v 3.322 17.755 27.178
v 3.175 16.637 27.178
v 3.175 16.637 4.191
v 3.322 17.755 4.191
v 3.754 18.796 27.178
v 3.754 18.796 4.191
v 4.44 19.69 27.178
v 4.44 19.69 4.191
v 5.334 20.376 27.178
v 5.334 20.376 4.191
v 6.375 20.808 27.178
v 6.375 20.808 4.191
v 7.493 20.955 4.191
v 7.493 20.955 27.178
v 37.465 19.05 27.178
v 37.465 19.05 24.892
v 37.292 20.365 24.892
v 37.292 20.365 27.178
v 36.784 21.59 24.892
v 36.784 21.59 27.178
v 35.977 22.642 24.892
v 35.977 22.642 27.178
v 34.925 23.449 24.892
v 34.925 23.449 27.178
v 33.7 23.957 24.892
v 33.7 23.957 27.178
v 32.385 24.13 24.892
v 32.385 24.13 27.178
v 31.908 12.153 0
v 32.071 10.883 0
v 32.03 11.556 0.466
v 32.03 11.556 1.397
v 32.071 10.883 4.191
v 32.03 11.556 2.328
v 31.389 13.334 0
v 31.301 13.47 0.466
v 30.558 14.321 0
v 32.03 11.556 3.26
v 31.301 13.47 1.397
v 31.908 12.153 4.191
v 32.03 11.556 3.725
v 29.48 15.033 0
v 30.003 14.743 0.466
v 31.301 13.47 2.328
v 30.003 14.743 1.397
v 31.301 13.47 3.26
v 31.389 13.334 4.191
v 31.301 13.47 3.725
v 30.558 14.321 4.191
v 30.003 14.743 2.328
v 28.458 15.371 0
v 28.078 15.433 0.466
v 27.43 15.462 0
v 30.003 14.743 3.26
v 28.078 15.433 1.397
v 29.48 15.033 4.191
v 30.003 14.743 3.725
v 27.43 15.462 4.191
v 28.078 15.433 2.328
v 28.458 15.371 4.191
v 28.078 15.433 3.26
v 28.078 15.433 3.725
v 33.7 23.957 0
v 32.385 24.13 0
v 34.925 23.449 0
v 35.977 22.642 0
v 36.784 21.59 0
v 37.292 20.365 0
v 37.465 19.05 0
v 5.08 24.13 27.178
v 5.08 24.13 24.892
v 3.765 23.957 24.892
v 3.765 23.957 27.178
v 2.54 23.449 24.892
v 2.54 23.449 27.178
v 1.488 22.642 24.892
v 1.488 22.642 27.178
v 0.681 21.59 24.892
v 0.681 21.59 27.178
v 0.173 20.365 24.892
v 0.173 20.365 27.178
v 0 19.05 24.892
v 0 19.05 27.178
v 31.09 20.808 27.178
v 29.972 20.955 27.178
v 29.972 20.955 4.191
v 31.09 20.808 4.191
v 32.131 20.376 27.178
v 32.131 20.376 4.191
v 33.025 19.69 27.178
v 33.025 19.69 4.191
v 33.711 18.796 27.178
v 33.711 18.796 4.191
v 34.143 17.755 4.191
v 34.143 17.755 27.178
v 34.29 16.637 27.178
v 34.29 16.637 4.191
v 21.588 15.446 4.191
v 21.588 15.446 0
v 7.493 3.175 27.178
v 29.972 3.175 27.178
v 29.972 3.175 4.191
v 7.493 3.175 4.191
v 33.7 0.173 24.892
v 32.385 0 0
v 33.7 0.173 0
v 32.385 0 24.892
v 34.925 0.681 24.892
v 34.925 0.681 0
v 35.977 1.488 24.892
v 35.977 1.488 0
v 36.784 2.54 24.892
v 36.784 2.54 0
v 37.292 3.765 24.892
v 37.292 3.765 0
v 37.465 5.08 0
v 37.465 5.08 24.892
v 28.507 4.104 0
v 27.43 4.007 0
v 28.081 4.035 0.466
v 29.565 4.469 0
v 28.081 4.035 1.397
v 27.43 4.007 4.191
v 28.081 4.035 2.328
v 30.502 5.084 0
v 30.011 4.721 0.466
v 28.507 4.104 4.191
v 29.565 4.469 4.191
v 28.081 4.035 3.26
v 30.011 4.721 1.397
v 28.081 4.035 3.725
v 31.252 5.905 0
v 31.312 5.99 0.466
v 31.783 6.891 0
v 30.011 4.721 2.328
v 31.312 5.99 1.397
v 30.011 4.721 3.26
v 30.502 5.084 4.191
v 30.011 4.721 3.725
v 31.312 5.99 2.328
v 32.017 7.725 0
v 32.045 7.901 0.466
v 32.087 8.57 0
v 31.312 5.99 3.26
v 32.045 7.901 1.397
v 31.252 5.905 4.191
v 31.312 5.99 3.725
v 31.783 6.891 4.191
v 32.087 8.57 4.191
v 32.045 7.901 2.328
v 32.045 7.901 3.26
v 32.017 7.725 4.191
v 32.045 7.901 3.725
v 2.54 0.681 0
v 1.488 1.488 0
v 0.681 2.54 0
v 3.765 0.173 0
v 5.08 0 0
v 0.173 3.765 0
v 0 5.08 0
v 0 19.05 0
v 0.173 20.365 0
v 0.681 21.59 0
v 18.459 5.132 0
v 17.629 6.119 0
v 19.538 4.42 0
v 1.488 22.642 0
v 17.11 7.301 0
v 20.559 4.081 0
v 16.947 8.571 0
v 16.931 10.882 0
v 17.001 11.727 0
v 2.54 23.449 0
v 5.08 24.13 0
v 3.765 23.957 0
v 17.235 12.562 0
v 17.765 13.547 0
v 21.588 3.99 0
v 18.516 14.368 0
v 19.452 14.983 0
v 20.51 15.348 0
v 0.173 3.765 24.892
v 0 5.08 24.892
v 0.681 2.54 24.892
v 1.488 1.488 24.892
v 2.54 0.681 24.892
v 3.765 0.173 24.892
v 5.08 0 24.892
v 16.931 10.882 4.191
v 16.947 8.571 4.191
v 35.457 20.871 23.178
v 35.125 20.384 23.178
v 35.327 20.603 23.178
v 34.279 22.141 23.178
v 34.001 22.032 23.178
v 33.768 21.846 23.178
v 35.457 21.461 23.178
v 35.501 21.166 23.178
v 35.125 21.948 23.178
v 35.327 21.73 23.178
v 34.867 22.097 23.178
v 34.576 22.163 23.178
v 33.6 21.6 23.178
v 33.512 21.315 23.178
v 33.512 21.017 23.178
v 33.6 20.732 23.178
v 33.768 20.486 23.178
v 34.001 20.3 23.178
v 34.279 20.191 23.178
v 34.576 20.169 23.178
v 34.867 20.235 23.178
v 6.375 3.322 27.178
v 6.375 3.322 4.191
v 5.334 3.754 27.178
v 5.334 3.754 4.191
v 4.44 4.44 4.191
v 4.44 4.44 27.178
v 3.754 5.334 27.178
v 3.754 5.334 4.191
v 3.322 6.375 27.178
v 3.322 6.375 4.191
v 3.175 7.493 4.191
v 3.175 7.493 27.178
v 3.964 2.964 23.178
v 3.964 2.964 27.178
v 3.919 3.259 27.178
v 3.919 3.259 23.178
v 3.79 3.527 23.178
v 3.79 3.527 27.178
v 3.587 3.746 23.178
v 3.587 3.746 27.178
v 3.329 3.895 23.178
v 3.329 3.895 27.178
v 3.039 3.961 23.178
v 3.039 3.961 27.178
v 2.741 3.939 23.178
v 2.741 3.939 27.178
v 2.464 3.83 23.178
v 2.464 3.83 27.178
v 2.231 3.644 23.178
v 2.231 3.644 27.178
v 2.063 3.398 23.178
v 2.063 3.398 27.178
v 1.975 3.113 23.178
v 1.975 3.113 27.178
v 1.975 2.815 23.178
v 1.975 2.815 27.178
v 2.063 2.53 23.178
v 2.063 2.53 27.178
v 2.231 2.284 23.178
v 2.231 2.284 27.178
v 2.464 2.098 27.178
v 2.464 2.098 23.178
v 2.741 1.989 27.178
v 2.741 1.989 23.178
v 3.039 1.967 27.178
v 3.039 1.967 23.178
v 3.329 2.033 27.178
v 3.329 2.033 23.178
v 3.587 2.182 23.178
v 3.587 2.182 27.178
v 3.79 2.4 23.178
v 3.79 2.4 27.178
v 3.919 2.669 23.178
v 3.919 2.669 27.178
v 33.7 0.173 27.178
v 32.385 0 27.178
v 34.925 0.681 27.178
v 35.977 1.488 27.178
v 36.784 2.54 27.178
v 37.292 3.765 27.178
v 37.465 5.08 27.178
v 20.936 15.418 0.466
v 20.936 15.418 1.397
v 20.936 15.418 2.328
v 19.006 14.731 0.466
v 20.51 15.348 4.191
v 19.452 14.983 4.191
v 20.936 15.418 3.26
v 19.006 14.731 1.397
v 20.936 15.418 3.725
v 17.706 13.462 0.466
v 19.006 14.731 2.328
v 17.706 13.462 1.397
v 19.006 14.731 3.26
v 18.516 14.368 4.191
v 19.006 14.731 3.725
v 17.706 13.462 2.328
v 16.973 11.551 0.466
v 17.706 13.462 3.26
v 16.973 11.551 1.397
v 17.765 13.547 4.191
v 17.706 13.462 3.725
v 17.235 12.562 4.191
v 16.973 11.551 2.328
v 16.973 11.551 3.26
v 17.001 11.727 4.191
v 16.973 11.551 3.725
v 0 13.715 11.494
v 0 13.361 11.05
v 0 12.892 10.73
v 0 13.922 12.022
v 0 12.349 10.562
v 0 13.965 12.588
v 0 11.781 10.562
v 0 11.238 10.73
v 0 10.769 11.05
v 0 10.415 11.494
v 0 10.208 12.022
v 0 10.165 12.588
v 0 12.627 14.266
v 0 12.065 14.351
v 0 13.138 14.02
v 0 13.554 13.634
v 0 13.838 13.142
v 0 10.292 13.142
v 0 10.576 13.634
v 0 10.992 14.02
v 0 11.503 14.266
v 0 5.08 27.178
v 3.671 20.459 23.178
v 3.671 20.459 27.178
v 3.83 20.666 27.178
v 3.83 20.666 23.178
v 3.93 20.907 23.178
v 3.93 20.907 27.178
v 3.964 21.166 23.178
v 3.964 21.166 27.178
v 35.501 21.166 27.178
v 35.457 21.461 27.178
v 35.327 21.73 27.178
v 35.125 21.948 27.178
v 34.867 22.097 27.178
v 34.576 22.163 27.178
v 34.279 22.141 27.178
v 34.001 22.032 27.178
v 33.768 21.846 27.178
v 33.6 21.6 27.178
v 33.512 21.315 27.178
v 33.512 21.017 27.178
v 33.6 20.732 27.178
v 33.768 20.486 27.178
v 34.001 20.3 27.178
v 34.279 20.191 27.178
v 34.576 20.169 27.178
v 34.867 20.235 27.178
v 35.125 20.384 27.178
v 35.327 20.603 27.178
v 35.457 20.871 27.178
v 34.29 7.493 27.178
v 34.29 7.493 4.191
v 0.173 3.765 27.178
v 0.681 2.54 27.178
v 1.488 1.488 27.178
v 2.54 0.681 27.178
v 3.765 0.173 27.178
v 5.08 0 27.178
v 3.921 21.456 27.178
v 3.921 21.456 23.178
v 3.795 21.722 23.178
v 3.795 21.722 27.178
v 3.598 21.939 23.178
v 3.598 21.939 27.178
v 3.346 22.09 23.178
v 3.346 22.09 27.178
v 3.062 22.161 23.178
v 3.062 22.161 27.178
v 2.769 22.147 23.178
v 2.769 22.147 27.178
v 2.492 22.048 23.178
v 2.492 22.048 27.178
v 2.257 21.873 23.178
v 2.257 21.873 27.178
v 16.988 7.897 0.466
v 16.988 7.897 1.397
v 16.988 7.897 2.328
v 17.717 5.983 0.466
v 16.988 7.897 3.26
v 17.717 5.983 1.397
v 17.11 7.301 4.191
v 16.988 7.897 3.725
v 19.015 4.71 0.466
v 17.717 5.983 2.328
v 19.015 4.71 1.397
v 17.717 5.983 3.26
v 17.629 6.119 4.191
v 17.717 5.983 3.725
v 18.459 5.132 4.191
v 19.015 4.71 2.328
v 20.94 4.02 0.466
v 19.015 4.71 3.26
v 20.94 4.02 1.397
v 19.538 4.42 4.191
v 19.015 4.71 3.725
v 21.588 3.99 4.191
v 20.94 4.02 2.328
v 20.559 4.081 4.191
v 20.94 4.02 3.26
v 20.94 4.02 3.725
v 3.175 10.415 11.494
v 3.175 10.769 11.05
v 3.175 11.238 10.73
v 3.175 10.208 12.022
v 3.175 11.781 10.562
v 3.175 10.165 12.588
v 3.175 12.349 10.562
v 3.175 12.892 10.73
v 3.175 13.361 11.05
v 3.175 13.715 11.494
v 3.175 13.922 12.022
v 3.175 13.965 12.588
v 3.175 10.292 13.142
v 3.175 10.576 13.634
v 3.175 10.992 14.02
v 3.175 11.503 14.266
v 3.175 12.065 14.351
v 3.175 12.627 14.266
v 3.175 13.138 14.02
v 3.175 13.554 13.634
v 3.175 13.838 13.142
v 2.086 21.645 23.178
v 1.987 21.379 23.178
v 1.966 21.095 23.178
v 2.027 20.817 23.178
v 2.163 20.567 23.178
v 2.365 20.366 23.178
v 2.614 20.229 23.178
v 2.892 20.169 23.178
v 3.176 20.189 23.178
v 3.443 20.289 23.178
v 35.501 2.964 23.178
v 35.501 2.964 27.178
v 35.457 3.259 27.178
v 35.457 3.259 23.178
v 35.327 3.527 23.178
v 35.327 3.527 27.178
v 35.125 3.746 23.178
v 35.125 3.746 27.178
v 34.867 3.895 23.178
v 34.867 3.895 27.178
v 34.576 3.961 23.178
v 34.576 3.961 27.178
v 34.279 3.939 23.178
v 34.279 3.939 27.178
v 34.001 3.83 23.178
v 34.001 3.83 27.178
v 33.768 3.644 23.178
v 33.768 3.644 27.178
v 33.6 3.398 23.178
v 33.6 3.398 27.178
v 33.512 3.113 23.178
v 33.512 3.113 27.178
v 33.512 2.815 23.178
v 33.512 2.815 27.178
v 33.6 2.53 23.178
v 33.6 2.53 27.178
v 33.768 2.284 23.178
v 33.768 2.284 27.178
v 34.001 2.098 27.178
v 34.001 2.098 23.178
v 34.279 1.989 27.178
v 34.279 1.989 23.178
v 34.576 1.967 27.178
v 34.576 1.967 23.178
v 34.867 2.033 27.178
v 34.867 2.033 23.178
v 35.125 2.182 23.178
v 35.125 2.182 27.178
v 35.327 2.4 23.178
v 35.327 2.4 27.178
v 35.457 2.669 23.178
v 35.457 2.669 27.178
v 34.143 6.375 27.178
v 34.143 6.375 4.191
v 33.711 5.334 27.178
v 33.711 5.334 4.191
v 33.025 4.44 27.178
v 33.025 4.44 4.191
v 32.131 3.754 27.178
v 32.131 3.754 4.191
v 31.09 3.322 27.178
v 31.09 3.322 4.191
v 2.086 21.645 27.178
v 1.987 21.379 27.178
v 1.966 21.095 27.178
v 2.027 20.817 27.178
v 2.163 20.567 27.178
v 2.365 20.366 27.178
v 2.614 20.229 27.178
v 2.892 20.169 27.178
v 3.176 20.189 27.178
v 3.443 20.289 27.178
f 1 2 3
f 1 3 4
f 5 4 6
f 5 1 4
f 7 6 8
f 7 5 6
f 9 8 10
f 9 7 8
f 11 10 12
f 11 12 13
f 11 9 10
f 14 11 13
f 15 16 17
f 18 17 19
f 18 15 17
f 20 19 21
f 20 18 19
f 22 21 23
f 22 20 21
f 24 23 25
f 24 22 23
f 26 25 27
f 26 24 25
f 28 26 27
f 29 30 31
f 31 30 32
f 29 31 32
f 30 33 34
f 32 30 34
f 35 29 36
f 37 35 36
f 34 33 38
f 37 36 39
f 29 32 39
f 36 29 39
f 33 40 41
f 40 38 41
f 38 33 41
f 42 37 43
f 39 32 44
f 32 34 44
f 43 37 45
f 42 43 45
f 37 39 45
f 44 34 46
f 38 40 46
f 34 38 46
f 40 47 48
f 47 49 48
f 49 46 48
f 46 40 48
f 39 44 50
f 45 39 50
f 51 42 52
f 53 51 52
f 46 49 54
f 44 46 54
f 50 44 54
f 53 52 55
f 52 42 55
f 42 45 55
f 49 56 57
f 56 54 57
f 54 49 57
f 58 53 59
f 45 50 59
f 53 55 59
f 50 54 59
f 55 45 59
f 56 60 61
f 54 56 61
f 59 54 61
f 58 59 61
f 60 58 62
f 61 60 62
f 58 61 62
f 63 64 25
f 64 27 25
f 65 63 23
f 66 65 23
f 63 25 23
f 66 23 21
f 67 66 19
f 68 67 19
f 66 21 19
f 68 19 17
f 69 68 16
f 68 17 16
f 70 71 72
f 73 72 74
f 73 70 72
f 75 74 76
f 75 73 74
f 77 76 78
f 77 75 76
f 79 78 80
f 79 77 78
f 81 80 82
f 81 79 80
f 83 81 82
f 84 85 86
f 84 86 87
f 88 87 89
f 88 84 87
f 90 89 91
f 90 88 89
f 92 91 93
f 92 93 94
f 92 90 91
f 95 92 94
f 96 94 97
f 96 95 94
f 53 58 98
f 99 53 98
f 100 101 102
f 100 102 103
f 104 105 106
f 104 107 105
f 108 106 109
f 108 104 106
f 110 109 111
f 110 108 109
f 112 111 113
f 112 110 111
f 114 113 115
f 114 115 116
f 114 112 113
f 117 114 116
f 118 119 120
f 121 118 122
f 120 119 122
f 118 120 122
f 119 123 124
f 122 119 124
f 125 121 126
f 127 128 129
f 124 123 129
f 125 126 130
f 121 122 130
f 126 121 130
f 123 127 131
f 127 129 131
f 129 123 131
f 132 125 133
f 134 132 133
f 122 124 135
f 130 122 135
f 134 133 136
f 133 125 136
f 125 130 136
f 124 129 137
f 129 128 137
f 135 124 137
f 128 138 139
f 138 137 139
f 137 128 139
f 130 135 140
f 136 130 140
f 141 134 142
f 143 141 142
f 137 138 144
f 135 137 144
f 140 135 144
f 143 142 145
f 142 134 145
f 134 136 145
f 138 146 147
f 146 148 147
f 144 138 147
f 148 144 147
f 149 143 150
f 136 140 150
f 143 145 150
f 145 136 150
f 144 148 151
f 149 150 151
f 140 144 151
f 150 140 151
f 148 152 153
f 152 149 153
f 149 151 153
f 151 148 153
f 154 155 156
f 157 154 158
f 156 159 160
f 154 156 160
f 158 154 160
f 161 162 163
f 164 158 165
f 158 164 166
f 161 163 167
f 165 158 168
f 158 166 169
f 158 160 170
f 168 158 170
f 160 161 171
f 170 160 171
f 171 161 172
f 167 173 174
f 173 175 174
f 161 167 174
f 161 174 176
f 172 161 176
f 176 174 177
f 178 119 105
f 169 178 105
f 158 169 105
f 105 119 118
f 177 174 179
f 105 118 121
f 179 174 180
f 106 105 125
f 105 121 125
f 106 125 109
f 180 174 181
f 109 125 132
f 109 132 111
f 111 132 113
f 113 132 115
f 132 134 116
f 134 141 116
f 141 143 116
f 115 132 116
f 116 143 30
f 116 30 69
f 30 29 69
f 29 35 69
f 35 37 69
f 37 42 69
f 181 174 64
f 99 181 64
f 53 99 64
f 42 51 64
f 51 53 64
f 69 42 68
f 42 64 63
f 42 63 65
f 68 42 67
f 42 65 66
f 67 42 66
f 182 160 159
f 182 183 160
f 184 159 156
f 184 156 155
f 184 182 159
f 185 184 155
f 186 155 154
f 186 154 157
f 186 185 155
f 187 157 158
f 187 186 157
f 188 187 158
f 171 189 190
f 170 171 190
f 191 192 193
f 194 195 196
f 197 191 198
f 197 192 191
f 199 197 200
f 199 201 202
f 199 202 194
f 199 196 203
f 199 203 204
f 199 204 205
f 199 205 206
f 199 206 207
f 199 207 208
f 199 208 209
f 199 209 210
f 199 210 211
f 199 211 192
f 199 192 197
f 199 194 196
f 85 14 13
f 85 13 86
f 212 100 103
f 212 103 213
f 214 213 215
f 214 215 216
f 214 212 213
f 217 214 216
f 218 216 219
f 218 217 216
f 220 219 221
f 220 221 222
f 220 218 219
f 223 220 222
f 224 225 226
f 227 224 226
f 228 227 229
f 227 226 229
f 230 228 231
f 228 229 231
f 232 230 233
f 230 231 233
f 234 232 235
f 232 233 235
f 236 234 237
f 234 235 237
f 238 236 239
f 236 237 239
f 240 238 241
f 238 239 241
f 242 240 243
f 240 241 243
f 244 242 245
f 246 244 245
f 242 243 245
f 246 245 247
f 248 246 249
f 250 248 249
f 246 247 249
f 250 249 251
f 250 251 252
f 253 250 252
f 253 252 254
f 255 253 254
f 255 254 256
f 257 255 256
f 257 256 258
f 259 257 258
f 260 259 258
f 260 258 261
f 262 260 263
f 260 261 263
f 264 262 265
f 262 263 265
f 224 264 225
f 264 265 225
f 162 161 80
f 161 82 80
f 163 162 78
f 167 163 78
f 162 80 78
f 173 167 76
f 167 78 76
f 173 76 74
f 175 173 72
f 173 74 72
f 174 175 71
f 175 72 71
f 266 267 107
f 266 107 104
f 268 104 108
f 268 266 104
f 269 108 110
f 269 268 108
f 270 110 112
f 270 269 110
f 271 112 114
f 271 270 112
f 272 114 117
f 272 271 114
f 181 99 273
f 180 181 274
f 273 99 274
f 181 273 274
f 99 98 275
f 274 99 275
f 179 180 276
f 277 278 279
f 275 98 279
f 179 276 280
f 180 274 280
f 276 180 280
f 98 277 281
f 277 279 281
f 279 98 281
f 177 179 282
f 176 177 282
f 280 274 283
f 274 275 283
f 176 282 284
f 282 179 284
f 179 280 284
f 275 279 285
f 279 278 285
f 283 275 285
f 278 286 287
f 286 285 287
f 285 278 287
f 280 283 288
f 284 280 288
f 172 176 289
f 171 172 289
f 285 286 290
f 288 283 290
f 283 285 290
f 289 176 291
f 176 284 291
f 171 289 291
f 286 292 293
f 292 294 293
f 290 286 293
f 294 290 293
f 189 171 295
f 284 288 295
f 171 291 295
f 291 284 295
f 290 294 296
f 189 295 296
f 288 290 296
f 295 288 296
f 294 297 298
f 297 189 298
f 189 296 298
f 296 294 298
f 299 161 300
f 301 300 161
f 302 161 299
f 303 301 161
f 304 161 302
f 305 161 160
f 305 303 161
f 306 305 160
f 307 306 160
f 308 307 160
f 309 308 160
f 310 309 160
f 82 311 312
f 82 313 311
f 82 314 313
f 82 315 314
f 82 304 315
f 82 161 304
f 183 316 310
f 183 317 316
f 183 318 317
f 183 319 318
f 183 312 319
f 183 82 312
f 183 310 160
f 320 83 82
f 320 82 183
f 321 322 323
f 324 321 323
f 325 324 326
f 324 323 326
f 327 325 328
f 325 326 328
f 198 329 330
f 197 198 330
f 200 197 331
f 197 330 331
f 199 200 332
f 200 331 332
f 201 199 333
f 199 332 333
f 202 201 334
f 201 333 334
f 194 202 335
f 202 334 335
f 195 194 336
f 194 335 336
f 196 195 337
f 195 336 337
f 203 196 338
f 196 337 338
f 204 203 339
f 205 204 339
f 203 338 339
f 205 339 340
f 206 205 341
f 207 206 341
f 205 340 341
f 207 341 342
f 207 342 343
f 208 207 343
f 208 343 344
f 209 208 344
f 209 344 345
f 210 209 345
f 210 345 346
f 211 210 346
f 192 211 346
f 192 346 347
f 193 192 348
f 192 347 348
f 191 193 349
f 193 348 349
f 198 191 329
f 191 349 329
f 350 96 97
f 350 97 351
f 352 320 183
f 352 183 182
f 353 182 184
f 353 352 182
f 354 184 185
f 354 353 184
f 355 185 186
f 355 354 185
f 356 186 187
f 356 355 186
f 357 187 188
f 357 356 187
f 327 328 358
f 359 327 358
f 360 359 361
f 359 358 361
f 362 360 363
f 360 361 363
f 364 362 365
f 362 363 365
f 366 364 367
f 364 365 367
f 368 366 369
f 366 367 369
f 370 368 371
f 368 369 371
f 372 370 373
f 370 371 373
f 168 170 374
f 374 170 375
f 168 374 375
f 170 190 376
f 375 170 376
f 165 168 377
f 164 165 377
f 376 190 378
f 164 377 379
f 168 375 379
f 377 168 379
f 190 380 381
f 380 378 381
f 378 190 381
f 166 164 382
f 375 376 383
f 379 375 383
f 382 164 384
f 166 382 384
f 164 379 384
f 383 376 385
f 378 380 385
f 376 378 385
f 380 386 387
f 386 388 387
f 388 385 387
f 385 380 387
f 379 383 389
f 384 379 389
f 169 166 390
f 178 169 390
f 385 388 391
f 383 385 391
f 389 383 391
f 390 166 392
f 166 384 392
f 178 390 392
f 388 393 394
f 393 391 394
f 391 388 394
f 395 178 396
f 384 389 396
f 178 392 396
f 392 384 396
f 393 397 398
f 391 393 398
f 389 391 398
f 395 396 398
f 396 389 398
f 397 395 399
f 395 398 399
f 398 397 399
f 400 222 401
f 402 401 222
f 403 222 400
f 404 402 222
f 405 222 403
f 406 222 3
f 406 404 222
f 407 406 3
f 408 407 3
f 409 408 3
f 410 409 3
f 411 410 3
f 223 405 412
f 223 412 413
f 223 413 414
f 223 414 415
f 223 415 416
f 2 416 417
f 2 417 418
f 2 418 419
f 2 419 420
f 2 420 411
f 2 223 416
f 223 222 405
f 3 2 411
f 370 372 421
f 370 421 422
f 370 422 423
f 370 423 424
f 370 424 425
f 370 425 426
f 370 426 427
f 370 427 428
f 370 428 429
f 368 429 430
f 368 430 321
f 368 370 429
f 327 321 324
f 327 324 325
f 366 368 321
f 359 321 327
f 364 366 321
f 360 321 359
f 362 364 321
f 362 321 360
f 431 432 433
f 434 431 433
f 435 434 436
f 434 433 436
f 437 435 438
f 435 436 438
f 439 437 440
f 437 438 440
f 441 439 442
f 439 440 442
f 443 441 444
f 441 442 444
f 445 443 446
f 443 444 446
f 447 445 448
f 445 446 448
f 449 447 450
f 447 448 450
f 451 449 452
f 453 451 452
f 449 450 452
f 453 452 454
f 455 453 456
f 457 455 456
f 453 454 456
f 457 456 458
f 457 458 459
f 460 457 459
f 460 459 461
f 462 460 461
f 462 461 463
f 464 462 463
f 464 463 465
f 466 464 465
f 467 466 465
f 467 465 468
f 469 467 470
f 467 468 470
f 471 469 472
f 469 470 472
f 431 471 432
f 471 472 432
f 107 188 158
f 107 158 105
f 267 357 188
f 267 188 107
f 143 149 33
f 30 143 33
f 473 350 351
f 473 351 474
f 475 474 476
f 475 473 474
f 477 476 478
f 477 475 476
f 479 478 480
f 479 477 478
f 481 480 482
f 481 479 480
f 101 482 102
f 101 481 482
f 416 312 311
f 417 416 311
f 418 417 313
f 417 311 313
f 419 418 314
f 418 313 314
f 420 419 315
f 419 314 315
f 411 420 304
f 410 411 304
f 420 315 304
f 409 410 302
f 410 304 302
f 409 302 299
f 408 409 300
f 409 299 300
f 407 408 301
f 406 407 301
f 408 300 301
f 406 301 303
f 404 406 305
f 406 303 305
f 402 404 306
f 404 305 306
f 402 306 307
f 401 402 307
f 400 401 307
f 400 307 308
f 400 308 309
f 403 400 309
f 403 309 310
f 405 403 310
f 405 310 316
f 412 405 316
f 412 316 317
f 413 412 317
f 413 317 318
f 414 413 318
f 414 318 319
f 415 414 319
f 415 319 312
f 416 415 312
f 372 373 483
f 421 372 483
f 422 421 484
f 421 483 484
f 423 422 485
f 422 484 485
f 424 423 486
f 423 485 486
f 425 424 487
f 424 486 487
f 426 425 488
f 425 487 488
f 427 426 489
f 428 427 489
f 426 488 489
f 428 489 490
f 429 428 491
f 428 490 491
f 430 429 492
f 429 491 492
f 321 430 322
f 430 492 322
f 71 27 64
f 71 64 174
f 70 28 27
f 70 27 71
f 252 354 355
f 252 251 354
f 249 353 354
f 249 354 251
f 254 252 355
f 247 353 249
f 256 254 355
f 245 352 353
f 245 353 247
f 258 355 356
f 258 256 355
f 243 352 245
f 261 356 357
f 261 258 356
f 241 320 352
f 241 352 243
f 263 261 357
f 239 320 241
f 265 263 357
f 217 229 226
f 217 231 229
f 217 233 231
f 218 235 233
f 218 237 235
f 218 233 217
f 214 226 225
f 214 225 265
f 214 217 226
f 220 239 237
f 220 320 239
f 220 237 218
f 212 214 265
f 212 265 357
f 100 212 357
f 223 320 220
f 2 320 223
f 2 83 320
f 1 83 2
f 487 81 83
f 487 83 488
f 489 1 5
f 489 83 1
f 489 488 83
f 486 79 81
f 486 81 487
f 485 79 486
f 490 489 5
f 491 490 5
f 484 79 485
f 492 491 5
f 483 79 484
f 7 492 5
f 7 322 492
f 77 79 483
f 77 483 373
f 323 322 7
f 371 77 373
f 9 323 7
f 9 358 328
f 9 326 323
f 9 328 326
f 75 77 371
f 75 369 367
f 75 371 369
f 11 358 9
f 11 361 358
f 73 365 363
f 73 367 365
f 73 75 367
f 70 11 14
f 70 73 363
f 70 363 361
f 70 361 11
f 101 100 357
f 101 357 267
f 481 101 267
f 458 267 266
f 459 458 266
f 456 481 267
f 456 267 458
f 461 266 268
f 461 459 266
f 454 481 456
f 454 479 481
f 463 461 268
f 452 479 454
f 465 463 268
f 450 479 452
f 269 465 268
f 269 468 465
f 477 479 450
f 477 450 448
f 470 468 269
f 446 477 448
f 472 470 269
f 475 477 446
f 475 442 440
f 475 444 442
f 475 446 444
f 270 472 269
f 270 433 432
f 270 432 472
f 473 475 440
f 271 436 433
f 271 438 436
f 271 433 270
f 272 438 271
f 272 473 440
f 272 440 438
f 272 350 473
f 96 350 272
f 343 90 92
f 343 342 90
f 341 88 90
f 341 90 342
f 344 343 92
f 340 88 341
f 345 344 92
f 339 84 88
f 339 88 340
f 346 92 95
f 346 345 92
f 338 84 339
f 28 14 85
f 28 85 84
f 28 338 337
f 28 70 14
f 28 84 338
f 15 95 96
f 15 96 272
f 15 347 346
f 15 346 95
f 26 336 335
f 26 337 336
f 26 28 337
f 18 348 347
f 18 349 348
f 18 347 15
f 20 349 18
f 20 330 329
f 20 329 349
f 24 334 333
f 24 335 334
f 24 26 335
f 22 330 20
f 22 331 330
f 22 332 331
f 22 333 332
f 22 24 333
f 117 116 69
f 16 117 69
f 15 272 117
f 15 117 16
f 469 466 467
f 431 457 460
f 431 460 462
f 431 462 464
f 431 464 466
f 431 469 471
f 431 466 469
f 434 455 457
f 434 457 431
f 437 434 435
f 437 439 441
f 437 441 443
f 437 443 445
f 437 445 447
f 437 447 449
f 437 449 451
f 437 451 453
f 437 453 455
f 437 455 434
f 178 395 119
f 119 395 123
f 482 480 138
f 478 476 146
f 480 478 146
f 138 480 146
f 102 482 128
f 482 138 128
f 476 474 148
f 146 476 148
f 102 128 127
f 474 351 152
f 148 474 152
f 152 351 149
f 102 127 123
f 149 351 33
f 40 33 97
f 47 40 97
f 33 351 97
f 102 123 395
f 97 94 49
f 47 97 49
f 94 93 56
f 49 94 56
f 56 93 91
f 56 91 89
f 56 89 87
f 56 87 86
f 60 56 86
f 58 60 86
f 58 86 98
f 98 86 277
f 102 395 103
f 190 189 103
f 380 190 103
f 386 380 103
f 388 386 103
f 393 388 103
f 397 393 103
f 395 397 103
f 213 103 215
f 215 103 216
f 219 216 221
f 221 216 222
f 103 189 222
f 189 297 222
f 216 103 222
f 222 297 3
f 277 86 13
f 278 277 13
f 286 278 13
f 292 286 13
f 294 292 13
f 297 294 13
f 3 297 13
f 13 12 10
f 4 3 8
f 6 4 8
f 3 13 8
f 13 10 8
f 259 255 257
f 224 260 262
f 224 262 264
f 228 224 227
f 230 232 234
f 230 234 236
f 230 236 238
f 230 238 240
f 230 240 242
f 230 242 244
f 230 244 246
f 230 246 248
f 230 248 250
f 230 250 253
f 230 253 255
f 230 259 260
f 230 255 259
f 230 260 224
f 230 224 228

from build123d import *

# Parameters (mm, degrees)
SKETCH2_W           = 37.465
SKETCH2_H           = 24.13
BOSS_EXTRUDE1_DEPTH = 24.892
CUT_EXTRUDE1_DEPTH  = 20.701
CUT_EXTRUDE3_DEPTH  = 4.191
FILLET1_R           = 5.08
BOSS_EXTRUDE3_START = 2.286
BOSS_EXTRUDE3_DEPTH = 2.286
SKETCH8_R           = 1.905
CUT_EXTRUDE4_DEPTH  = 7.62
BOSS_EXTRUDE5_START = 2.286
BOSS_EXTRUDE5_DEPTH = 2.286
SKETCH10_R          = 1
CUT_EXTRUDE5_DEPTH  = 4


with BuildPart() as part:
    # Sketch2 → Boss-Extrude1 (new body)
    with BuildSketch(Plane.XY):
        with Locations((18.7325, 12.065)):
            Rectangle(SKETCH2_W, SKETCH2_H)
    extrude(amount=BOSS_EXTRUDE1_DEPTH)

    # Sketch3 → Cut-Extrude1 (cut)
    with BuildSketch(Plane.XY.offset(24.892)):
        with BuildLine():
            ThreePointArc((3.175, 16.637), (4.439712919, 19.690287081), (7.493, 20.955))
            Line((7.493, 20.955), (29.972, 20.955))
            ThreePointArc((29.972, 20.955), (33.025287081, 19.690287081), (34.29, 16.637))
            Line((34.29, 16.637), (34.29, 7.493))
            ThreePointArc((34.29, 7.493), (33.025287081, 4.439712919), (29.972, 3.175))
            Line((29.972, 3.175), (7.493, 3.175))
            ThreePointArc((7.493, 3.175), (4.439712919, 4.439712919), (3.175, 7.493))
            Line((3.175, 7.493), (3.175, 16.637))
        make_face()
    extrude(amount=-CUT_EXTRUDE1_DEPTH, mode=Mode.SUBTRACT)

    # Sketch4 → Cut-Extrude3 (cut)
    with BuildSketch(Plane.XY.offset(4.191)):
        with BuildLine():
            Line((32.086974483, 8.570131), (32.07077796, 10.882539488))
            add(Edge.make_bspline(
                [(32.07077796, 10.882539488), (32.073215089, 11.03512727), (32.05346317, 11.384531492), (31.98348624, 11.89897185), (31.690265244, 12.891461502), (30.781603575, 14.240804474), (29.41900903, 15.119220909), (28.414706523, 15.393168176), (27.909381539, 15.452204781), (27.554769457, 15.464756938), (27.429691001, 15.46229384)],
                knots=[0, 0, 0, 0.046875, 0.09375, 0.1875, 0.375, 0.625, 0.8125, 0.90625, 0.953125, 1, 1, 1], degree=2))
            Line((27.429691001, 15.46229384), (21.587714207, 15.44582783))
            add(Edge.make_bspline(
                [(21.587714207, 15.44582783), (21.462803996, 15.448731855), (21.106730304, 15.437338634), (20.595765352, 15.378996632), (19.591692577, 15.107051395), (18.225687665, 14.229774678), (17.316214622, 12.885953496), (17.020022679, 11.889285009), (16.949885556, 11.382167163), (16.92906595, 11.034797324), (16.930958193, 10.882006896)],
                knots=[0, 0, 0, 0.046875, 0.09375, 0.1875, 0.375, 0.625, 0.8125, 0.90625, 0.953125, 1, 1, 1], degree=2))
            Line((16.930958193, 10.882006896), (16.947147256, 8.570663591))
            add(Edge.make_bspline(
                [(16.947147256, 8.570663591), (16.944692803, 8.418076087), (16.96440505, 8.068669624), (17.034323571, 7.554221325), (17.32743188, 6.561698387), (18.235940341, 5.212252256), (19.598435143, 4.33368112), (20.60270654, 4.059619828), (21.108024818, 4.00052585), (21.462635472, 3.98793343), (21.587714207, 3.990382327)],
                knots=[0, 0, 0, 0.046875, 0.09375, 0.1875, 0.375, 0.625, 0.8125, 0.90625, 0.953125, 1, 1, 1], degree=2))
            Line((21.587714207, 3.990382327), (27.429691002, 4.006848338))
            add(Edge.make_bspline(
                [(27.429691002, 4.006848338), (27.554600877, 4.003929875), (27.910675883, 4.015281941), (28.421647575, 4.073564883), (29.425751775, 4.345394065), (30.791858076, 5.22251289), (31.701486436, 6.566228943), (31.997793574, 7.562863188), (32.067989311, 8.069972924), (32.088849066, 8.417340355), (32.086974483, 8.570131)],
                knots=[0, 0, 0, 0.046875, 0.09375, 0.1875, 0.375, 0.625, 0.8125, 0.90625, 0.953125, 1, 1, 1], degree=2))
        make_face()
    extrude(amount=-CUT_EXTRUDE3_DEPTH, mode=Mode.SUBTRACT)

    # Fillet1
    fillet1_edges = [part.edges().sort_by_distance(p)[0] for p in [
        (0, 24.13, 12.446),
        (37.465, 24.13, 12.446),
        (37.465, 0, 12.446),
        (0, 0, 12.446),
    ]]
    fillet(fillet1_edges, radius=FILLET1_R)

    # Sketch7 → Boss-Extrude3 (add)
    with BuildSketch(Plane.XY.offset(24.892).offset(BOSS_EXTRUDE3_START)):
        with BuildLine():
            ThreePointArc((35.59175, 18.3515), (34.252642204, 21.584392204), (31.01975, 22.9235))
            Line((31.01975, 22.9235), (6.44525, 22.9235))
            ThreePointArc((6.44525, 22.9235), (3.212357796, 21.584392204), (1.87325, 18.3515))
            Line((1.87325, 18.3515), (1.87325, 5.7785))
            ThreePointArc((1.87325, 5.7785), (3.212357796, 2.545607796), (6.44525, 1.2065))
            Line((6.44525, 1.2065), (31.01975, 1.2065))
            ThreePointArc((31.01975, 1.2065), (34.252642204, 2.545607796), (35.59175, 5.7785))
            Line((35.59175, 5.7785), (35.59175, 18.3515))
        make_face()
        with BuildLine():
            ThreePointArc((3.175, 16.637), (4.439712919, 19.690287081), (7.493, 20.955))
            Line((7.493, 20.955), (29.972, 20.955))
            ThreePointArc((29.972, 20.955), (33.025287081, 19.690287081), (34.29, 16.637))
            Line((34.29, 16.637), (34.29, 7.493))
            ThreePointArc((34.29, 7.493), (33.025287081, 4.439712919), (29.972, 3.175))
            Line((29.972, 3.175), (7.493, 3.175))
            ThreePointArc((7.493, 3.175), (4.439712919, 4.439712919), (3.175, 7.493))
            Line((3.175, 7.493), (3.175, 16.637))
        make_face(mode=Mode.SUBTRACT)
    extrude(amount=-BOSS_EXTRUDE3_DEPTH)

    # Sketch8 → Cut-Extrude4 (cut)
    with BuildSketch(Plane.ZY):
        with Locations((12.446, 12.065)):
            Circle(SKETCH8_R)
    extrude(amount=-CUT_EXTRUDE4_DEPTH, mode=Mode.SUBTRACT)

    # Sketch9 → Boss-Extrude5 (add)
    with BuildSketch(Plane.XY.offset(24.892).offset(BOSS_EXTRUDE5_START)):
        with BuildLine():
            Line((37.465, 5.08), (37.465, 19.05))
            ThreePointArc((37.465, 19.05), (35.977102448, 22.642102448), (32.385, 24.13))
            Line((32.385, 24.13), (5.08, 24.13))
            ThreePointArc((5.08, 24.13), (1.487897552, 22.642102448), (0, 19.05))
            Line((0, 19.05), (0, 5.08))
            ThreePointArc((0, 5.08), (1.487897552, 1.487897552), (5.08, 0))
            Line((5.08, 0), (32.385, 0))
            ThreePointArc((32.385, 0), (35.977102448, 1.487897552), (37.465, 5.08))
        make_face()
        with BuildLine():
            Line((6.44525, 1.2065), (31.01975, 1.2065))
            ThreePointArc((31.01975, 1.2065), (34.252642204, 2.545607796), (35.59175, 5.7785))
            Line((35.59175, 5.7785), (35.59175, 18.3515))
            ThreePointArc((35.59175, 18.3515), (34.252642204, 21.584392204), (31.01975, 22.9235))
            Line((31.01975, 22.9235), (6.44525, 22.9235))
            ThreePointArc((6.44525, 22.9235), (3.212357796, 21.584392204), (1.87325, 18.3515))
            Line((1.87325, 18.3515), (1.87325, 5.7785))
            ThreePointArc((1.87325, 5.7785), (3.212357796, 2.545607796), (6.44525, 1.2065))
        make_face(mode=Mode.SUBTRACT)
    extrude(amount=-BOSS_EXTRUDE5_DEPTH)

    # Sketch10 → Cut-Extrude5 (cut)
    with BuildSketch(Plane.XY.offset(27.178)):
        with BuildLine():
            ThreePointArc((3.963805235, 21.166194765), (3.346488668, 22.090074297), (2.256698454, 21.873301546))
            Line((2.256698454, 21.873301546), (3.670912016, 20.459087984))
            ThreePointArc((3.670912016, 20.459087984), (3.887684768, 20.783511332), (3.963805235, 21.166194765))
        make_face()
        with BuildLine():
            Line((3.670912016, 20.459087984), (2.256698454, 21.873301546))
            ThreePointArc((2.256698454, 21.873301546), (2.256698454, 20.459087984), (3.670912016, 20.459087984))
        make_face()
        with Locations((34.501194765, 21.166194765)):
            Circle(SKETCH10_R)
        with Locations((34.501194765, 2.963805235)):
            Circle(SKETCH10_R)
        with Locations((2.963805235, 2.963805235)):
            Circle(SKETCH10_R)
    extrude(amount=-CUT_EXTRUDE5_DEPTH, mode=Mode.SUBTRACT)


solid = part.part
